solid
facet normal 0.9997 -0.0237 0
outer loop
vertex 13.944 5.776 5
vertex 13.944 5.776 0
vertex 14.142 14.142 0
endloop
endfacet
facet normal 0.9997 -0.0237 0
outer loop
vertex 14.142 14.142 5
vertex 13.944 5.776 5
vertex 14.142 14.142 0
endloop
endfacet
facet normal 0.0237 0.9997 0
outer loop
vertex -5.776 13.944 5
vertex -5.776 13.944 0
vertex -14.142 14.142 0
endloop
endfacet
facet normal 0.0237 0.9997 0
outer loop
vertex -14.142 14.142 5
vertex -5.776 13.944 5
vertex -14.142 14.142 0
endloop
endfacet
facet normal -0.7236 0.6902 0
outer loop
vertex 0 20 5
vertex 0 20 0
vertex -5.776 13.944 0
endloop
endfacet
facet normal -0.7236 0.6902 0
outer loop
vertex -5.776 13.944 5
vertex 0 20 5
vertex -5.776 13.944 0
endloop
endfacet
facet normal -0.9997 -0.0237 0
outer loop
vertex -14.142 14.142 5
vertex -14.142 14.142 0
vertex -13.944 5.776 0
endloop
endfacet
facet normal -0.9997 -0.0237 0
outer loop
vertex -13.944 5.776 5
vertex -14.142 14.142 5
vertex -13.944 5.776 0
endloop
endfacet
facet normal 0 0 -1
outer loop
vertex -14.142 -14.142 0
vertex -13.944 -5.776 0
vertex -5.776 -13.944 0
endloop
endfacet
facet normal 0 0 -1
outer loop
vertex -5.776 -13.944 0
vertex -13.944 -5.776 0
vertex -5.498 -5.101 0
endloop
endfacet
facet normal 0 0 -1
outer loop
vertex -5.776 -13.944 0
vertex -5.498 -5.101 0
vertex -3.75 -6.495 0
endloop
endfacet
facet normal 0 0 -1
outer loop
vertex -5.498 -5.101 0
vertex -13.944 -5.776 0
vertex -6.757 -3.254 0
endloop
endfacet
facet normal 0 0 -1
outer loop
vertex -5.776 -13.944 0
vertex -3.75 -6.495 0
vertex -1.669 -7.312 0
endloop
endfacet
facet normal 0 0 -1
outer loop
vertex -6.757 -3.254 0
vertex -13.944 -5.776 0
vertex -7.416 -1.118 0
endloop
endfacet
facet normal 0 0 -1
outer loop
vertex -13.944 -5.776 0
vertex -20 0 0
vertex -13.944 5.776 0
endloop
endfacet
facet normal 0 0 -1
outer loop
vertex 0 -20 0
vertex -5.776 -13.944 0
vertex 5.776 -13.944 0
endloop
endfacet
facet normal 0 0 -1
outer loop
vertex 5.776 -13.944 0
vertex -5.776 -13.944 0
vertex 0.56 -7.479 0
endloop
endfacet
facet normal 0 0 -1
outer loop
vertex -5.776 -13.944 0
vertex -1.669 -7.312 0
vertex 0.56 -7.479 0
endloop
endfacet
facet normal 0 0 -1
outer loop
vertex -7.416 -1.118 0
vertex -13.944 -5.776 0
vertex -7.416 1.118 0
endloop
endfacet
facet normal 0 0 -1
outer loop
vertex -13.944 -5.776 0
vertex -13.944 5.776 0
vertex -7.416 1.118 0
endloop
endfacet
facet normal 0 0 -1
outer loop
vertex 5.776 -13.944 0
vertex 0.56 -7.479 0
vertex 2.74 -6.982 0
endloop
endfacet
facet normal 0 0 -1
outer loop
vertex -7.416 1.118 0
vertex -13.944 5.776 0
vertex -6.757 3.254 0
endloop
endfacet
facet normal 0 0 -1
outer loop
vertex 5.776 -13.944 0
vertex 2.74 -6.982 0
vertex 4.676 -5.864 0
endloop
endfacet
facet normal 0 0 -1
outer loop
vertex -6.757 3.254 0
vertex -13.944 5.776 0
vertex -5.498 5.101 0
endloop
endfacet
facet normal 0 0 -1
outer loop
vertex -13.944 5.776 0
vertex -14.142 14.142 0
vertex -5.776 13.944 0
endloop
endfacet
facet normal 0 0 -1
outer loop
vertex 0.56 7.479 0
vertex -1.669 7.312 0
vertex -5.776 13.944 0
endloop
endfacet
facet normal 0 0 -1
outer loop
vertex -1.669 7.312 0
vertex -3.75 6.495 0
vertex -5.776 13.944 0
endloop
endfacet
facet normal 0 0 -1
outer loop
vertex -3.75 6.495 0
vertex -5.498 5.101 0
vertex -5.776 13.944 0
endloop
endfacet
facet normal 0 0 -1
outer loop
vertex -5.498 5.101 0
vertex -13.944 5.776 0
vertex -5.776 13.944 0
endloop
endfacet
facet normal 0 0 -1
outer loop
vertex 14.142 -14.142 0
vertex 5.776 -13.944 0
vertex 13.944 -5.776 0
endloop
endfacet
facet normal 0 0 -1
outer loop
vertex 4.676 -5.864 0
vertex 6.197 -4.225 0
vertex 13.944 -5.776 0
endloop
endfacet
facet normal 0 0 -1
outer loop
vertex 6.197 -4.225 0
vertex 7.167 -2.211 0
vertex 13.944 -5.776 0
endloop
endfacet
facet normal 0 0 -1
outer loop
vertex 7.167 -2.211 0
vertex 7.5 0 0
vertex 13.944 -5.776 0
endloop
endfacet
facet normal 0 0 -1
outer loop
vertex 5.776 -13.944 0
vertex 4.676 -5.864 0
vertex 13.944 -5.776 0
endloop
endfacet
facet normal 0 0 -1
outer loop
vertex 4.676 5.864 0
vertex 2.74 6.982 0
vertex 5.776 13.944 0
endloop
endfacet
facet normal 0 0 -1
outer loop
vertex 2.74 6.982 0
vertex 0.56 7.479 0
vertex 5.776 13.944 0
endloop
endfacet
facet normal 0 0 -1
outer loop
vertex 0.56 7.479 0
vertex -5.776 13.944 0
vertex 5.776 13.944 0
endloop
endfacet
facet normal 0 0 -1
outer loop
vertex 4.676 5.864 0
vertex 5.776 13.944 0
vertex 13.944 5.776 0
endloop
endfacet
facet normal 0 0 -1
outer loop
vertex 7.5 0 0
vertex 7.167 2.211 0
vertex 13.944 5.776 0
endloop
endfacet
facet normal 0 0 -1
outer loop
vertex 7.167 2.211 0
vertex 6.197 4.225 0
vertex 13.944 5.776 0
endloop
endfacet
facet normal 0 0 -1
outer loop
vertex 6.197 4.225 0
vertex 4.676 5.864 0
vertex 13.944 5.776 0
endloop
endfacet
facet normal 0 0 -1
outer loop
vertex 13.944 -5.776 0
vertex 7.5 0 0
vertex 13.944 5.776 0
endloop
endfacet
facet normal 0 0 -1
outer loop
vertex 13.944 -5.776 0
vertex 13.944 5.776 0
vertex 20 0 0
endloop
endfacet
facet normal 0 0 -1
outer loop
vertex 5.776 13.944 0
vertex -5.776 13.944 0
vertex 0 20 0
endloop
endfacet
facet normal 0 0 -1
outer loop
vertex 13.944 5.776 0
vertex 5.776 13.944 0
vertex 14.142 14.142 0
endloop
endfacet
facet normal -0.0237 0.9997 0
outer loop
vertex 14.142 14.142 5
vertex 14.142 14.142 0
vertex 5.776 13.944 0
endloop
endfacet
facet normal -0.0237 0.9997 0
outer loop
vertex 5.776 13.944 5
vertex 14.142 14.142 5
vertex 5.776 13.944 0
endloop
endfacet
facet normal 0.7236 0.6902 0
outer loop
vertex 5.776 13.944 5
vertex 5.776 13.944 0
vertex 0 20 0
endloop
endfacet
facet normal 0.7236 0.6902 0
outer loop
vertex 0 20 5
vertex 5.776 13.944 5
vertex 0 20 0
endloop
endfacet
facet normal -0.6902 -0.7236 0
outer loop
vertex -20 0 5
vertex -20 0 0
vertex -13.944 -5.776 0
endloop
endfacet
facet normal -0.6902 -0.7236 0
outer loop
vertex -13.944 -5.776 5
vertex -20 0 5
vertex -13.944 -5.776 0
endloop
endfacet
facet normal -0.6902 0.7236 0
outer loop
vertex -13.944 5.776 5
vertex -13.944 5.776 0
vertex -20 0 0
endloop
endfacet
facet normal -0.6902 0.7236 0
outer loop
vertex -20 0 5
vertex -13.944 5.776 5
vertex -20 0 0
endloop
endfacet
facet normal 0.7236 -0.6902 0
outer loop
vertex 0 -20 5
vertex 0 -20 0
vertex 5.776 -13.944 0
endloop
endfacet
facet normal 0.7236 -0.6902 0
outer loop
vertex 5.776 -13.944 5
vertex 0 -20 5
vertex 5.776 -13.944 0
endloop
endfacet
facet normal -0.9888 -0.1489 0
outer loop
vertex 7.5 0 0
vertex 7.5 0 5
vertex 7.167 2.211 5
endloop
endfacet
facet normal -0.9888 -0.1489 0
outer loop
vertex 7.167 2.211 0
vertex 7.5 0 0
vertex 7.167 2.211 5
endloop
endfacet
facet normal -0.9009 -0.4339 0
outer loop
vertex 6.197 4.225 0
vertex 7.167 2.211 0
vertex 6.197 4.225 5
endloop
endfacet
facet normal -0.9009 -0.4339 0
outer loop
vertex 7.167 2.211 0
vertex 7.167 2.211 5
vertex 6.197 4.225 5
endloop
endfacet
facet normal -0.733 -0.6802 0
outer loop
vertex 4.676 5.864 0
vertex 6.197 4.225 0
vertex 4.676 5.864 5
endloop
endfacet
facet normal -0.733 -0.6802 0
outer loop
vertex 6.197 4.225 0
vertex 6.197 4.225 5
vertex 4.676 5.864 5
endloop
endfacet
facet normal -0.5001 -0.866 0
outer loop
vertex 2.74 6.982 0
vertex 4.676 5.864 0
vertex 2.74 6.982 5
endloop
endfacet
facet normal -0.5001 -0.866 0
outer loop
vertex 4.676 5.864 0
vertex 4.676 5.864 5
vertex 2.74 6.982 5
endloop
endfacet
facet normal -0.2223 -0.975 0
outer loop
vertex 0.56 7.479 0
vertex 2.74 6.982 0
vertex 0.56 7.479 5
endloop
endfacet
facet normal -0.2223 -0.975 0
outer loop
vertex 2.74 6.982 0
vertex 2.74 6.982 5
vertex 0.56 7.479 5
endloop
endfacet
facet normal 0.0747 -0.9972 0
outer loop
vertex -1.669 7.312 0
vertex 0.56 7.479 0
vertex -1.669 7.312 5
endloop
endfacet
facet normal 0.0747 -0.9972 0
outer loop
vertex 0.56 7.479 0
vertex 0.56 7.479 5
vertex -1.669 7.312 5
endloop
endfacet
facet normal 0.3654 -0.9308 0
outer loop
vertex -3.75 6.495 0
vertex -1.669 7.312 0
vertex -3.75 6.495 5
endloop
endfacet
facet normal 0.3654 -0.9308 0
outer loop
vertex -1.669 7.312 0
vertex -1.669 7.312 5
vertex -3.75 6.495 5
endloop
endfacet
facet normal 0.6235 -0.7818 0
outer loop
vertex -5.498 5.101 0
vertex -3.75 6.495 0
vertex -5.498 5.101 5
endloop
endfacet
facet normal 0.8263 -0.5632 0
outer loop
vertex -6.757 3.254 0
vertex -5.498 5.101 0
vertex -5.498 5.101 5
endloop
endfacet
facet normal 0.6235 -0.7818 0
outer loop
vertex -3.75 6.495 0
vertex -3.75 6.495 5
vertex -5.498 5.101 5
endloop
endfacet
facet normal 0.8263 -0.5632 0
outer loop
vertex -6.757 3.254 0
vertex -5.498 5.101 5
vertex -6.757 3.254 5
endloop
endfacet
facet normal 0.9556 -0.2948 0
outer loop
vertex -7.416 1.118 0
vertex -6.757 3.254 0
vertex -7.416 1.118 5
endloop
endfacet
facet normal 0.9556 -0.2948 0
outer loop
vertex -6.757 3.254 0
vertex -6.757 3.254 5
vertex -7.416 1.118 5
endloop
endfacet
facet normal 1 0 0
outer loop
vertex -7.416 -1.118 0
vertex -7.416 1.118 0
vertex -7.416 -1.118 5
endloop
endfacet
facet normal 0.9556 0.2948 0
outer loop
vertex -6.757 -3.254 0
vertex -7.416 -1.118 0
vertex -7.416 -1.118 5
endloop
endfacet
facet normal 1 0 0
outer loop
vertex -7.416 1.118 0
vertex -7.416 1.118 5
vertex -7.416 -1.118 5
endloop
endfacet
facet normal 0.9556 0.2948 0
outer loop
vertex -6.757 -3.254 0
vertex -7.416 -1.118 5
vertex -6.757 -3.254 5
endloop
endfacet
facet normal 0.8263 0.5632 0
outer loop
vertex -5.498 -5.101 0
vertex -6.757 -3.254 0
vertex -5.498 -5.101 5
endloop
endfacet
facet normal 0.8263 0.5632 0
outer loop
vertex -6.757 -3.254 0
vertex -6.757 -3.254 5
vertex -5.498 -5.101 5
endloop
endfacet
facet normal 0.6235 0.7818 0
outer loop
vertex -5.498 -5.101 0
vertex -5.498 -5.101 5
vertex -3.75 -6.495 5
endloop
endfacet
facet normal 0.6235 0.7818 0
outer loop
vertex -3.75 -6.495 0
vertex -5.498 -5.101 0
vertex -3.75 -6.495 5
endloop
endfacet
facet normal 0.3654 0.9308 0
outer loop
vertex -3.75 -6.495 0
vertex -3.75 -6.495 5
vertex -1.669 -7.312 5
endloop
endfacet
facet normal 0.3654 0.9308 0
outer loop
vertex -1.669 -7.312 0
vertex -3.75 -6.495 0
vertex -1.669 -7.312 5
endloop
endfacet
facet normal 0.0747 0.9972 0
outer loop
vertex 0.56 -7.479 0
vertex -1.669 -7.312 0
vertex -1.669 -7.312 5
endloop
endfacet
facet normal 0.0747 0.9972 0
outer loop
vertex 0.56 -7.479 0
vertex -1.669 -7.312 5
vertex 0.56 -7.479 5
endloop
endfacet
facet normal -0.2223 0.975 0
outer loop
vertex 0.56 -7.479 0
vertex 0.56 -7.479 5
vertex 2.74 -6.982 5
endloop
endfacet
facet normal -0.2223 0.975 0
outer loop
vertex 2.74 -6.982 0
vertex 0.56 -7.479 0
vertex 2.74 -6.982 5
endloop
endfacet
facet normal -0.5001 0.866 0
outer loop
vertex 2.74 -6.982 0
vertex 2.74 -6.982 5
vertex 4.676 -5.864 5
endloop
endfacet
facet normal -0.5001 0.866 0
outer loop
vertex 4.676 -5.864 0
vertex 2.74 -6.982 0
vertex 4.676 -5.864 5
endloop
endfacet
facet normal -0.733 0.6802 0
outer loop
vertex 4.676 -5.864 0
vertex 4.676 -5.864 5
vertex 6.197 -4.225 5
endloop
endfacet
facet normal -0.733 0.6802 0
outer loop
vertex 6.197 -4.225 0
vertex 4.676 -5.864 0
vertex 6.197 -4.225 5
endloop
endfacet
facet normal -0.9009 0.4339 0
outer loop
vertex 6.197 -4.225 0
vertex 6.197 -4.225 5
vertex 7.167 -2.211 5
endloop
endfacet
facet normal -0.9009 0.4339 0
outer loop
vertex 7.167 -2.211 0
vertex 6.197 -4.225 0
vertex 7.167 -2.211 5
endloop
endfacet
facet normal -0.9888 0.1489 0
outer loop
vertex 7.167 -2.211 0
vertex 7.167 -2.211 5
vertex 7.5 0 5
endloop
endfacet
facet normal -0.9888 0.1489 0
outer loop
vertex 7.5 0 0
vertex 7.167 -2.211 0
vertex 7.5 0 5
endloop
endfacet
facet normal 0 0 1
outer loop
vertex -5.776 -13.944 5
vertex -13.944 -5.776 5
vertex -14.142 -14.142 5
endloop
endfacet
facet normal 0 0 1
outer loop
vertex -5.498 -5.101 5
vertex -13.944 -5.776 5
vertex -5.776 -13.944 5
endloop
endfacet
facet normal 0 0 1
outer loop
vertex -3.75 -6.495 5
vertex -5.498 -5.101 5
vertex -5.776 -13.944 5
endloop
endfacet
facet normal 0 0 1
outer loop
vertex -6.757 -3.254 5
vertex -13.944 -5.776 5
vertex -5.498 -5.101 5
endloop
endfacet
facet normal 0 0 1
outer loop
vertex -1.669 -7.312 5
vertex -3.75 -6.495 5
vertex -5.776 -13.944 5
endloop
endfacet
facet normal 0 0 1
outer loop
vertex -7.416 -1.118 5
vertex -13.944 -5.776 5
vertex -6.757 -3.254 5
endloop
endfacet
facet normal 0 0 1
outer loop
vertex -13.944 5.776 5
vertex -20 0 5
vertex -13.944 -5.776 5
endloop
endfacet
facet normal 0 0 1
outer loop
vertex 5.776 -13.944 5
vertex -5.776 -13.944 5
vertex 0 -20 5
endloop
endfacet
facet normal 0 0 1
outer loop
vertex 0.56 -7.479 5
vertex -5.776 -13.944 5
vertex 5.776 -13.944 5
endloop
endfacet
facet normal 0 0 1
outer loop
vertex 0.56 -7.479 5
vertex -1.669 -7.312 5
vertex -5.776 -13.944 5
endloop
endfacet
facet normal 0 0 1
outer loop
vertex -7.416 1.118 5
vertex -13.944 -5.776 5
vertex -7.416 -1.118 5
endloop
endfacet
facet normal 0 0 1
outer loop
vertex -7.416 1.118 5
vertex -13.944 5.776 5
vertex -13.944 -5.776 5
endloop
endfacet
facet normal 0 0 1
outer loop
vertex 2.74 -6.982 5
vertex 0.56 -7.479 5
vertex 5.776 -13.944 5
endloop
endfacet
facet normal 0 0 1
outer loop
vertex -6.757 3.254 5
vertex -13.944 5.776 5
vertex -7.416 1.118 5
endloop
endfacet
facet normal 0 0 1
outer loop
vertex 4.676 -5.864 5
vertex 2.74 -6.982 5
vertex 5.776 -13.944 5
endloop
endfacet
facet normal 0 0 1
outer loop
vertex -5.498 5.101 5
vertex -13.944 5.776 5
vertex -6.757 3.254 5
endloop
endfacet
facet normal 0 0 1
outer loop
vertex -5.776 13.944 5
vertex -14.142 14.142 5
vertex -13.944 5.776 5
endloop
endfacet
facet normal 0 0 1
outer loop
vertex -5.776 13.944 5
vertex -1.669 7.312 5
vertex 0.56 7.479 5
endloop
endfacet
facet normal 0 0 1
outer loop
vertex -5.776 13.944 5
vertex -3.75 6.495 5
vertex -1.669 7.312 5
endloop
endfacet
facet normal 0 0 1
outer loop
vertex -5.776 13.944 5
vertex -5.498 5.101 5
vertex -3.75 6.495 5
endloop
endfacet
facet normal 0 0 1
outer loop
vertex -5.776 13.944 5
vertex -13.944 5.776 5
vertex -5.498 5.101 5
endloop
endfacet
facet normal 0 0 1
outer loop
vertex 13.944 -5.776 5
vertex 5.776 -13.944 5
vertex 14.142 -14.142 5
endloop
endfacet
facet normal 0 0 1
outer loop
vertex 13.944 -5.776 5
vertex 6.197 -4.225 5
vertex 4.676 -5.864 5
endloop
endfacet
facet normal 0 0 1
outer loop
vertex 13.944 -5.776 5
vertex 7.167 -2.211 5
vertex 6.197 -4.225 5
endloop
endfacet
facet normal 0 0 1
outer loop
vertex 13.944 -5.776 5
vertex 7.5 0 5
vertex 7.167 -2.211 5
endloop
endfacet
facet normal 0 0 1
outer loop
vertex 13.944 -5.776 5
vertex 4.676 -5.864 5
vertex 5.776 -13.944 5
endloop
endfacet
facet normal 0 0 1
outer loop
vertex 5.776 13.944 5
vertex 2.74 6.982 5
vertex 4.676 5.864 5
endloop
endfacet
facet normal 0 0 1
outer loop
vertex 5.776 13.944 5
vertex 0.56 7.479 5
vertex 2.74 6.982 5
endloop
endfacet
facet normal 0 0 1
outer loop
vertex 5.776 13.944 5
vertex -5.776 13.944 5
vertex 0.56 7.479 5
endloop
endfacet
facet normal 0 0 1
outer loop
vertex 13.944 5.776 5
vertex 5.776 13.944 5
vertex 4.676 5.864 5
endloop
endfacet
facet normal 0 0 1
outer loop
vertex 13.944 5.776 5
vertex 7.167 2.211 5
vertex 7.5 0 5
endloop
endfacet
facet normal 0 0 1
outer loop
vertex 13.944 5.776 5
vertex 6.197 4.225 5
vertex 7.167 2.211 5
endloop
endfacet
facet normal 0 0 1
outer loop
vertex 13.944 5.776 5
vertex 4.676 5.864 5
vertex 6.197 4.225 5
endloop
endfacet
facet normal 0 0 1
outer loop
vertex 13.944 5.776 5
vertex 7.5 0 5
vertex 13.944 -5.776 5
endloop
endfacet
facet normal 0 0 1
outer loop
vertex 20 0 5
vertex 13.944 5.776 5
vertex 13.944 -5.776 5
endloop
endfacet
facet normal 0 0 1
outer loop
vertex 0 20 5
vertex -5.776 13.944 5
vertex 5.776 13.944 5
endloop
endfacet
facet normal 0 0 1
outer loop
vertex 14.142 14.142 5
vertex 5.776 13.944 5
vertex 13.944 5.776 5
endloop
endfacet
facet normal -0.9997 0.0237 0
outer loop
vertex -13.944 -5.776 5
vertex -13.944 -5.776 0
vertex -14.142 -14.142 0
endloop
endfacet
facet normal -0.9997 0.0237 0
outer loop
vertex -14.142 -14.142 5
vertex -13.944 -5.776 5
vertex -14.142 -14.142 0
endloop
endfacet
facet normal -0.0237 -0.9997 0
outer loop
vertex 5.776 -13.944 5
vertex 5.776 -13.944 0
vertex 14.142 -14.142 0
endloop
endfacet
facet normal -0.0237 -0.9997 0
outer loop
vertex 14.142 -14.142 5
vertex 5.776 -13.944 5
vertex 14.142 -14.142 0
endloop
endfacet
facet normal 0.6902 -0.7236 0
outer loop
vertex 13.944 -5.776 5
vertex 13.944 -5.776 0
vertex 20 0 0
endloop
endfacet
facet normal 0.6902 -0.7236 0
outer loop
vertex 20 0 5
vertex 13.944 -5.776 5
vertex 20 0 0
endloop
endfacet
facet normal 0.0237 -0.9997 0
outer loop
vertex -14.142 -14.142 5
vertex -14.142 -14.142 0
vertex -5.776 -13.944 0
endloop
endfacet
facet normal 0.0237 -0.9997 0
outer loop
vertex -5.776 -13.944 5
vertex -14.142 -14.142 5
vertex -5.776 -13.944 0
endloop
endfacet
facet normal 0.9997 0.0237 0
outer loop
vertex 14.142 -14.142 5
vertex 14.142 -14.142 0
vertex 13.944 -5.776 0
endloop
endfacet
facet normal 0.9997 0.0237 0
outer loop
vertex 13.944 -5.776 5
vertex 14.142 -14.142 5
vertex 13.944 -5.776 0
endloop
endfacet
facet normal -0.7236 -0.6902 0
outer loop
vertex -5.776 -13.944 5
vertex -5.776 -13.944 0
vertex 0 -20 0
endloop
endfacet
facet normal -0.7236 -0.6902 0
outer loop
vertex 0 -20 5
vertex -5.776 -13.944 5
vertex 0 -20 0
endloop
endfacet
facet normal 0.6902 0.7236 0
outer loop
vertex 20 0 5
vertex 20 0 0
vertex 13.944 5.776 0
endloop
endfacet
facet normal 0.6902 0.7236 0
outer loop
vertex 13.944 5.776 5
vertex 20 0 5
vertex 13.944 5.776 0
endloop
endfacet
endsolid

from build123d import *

# Parameters (mm, degrees)
F1_DEPTH = 5
F2_R     = 7.5
F3_DEPTH = 25


with BuildPart() as f1:
    # F0 (on Top) → F1 (new body)
    with BuildSketch(Plane.XY):
        with BuildLine():
            ThreePointArc((13.93824703, 5.5430379513), (14.7321706726, 2.8219049018), (15, 0))
            ThreePointArc((15, 0), (14.7321706726, -2.8219049018), (13.93824703, -5.5430379513))
            Line((13.93824703, -5.5430379513), (13.9437634587, -5.7756959351))
            Line((13.9437634587, -5.7756959351), (20, 0))
            Line((20, 0), (13.9437634587, 5.7756959351))
            Line((13.9437634587, 5.7756959351), (13.93824703, 5.5430379513))
        make_face()
        with BuildLine():
            ThreePointArc((13.7753487165, 5.9363092691), (13.8581929877, 5.7402514855), (13.93824703, 5.5430379513))
            Line((13.93824703, 5.5430379513), (13.9437634587, 5.7756959351))
            Line((13.9437634587, 5.7756959351), (13.7753487165, 5.9363092691))
        make_face()
        with BuildLine():
            Line((13.9437634587, -5.7756959351), (13.93824703, -5.5430379513))
            ThreePointArc((13.93824703, -5.5430379513), (13.8581929877, -5.7402514855), (13.7753487165, -5.9363092691))
            Line((13.7753487165, -5.9363092691), (13.9437634587, -5.7756959351))
        make_face()
        with BuildLine():
            ThreePointArc((5.9363092691, 13.7753487165), (10.6066017178, 10.6066017178), (13.7753487165, 5.9363092691))
            Line((13.7753487165, 5.9363092691), (13.9437634587, 5.7756959351))
            Line((13.9437634587, 5.7756959351), (14.1421356237, 14.1421356237))
            Line((14.1421356237, 14.1421356237), (5.7756959351, 13.9437634587))
            Line((5.7756959351, 13.9437634587), (5.9363092691, 13.7753487165))
        make_face()
        with BuildLine():
            Line((13.9437634587, -5.7756959351), (13.7753487165, -5.9363092691))
            ThreePointArc((13.7753487165, -5.9363092691), (10.6066017178, -10.6066017178), (5.9363092691, -13.7753487165))
            Line((5.9363092691, -13.7753487165), (5.7756959351, -13.9437634587))
            Line((5.7756959351, -13.9437634587), (14.1421356237, -14.1421356237))
            Line((14.1421356237, -14.1421356237), (13.9437634587, -5.7756959351))
        make_face()
        with BuildLine():
            ThreePointArc((5.5430379513, 13.93824703), (5.7402514855, 13.8581929877), (5.9363092691, 13.7753487165))
            Line((5.9363092691, 13.7753487165), (5.7756959351, 13.9437634587))
            Line((5.7756959351, 13.9437634587), (5.5430379513, 13.93824703))
        make_face()
        with BuildLine():
            Line((5.7756959351, -13.9437634587), (5.9363092691, -13.7753487165))
            ThreePointArc((5.9363092691, -13.7753487165), (5.7402514855, -13.8581929877), (5.5430379513, -13.93824703))
            Line((5.5430379513, -13.93824703), (5.7756959351, -13.9437634587))
        make_face()
        with BuildLine():
            ThreePointArc((0, 15), (2.8219049018, 14.7321706726), (5.5430379513, 13.93824703))
            Line((5.5430379513, 13.93824703), (5.7756959351, 13.9437634587))
            Line((5.7756959351, 13.9437634587), (0, 20))
            Line((0, 20), (0, 15))
        make_face()
        with BuildLine():
            Line((5.7756959351, -13.9437634587), (5.5430379513, -13.93824703))
            ThreePointArc((5.5430379513, -13.93824703), (0, -15), (-5.5430379513, -13.93824703))
            Line((-5.5430379513, -13.93824703), (-5.7756959351, -13.9437634587))
            Line((-5.7756959351, -13.9437634587), (0, -20))
            Line((0, -20), (5.7756959351, -13.9437634587))
        make_face()
        with BuildLine():
            ThreePointArc((-5.5430379513, 13.93824703), (-2.8219049018, 14.7321706726), (0, 15))
            Line((0, 15), (0, 20))
            Line((0, 20), (-5.7756959351, 13.9437634587))
            Line((-5.7756959351, 13.9437634587), (-5.5430379513, 13.93824703))
        make_face()
        with BuildLine():
            Line((-5.7756959351, -13.9437634587), (-5.5430379513, -13.93824703))
            ThreePointArc((-5.5430379513, -13.93824703), (-5.7402514855, -13.8581929877), (-5.9363092691, -13.7753487165))
            Line((-5.9363092691, -13.7753487165), (-5.7756959351, -13.9437634587))
        make_face()
        with BuildLine():
            ThreePointArc((-5.9363092691, 13.7753487165), (-5.7402514855, 13.8581929877), (-5.5430379513, 13.93824703))
            Line((-5.5430379513, 13.93824703), (-5.7756959351, 13.9437634587))
            Line((-5.7756959351, 13.9437634587), (-5.9363092691, 13.7753487165))
        make_face()
        with BuildLine():
            Line((-5.9363092691, 13.7753487165), (-5.7756959351, 13.9437634587))
            Line((-5.7756959351, 13.9437634587), (-14.1421356237, 14.1421356237))
            Line((-14.1421356237, 14.1421356237), (-13.9437634587, 5.7756959351))
            Line((-13.9437634587, 5.7756959351), (-13.7753487165, 5.9363092691))
            ThreePointArc((-13.7753487165, 5.9363092691), (-10.6066017178, 10.6066017178), (-5.9363092691, 13.7753487165))
        make_face()
        with BuildLine():
            Line((-5.7756959351, -13.9437634587), (-5.9363092691, -13.7753487165))
            ThreePointArc((-5.9363092691, -13.7753487165), (-10.6066017178, -10.6066017178), (-13.7753487165, -5.9363092691))
            Line((-13.7753487165, -5.9363092691), (-13.9437634587, -5.7756959351))
            Line((-13.9437634587, -5.7756959351), (-14.1421356237, -14.1421356237))
            Line((-14.1421356237, -14.1421356237), (-5.7756959351, -13.9437634587))
        make_face()
        with BuildLine():
            Line((-13.9437634587, -5.7756959351), (-13.7753487165, -5.9363092691))
            ThreePointArc((-13.7753487165, -5.9363092691), (-13.8581929877, -5.7402514855), (-13.93824703, -5.5430379513))
            Line((-13.93824703, -5.5430379513), (-13.9437634587, -5.7756959351))
        make_face()
        with BuildLine():
            ThreePointArc((-13.93824703, 5.5430379513), (-13.8581929877, 5.7402514855), (-13.7753487165, 5.9363092691))
            Line((-13.7753487165, 5.9363092691), (-13.9437634587, 5.7756959351))
            Line((-13.9437634587, 5.7756959351), (-13.93824703, 5.5430379513))
        make_face()
        with BuildLine():
            Line((-13.93824703, 5.5430379513), (-13.9437634587, 5.7756959351))
            Line((-13.9437634587, 5.7756959351), (-20, 0))
            Line((-20, 0), (-13.9437634587, -5.7756959351))
            Line((-13.9437634587, -5.7756959351), (-13.93824703, -5.5430379513))
            ThreePointArc((-13.93824703, -5.5430379513), (-15, 0), (-13.93824703, 5.5430379513))
        make_face()
        with BuildLine():
            ThreePointArc((13.93824703, -5.5430379513), (14.7321706726, -2.8219049018), (15, 0))
            ThreePointArc((15, 0), (14.7321706726, 2.8219049018), (13.93824703, 5.5430379513))
            ThreePointArc((13.93824703, 5.5430379513), (13.8581929877, 5.7402514855), (13.7753487165, 5.9363092691))
            ThreePointArc((13.7753487165, 5.9363092691), (10.6066017178, 10.6066017178), (5.9363092691, 13.7753487165))
            ThreePointArc((5.9363092691, 13.7753487165), (5.7402514855, 13.8581929877), (5.5430379513, 13.93824703))
            ThreePointArc((5.5430379513, 13.93824703), (2.8219049018, 14.7321706726), (0, 15))
            ThreePointArc((0, 15), (-2.8219049018, 14.7321706726), (-5.5430379513, 13.93824703))
            ThreePointArc((-5.5430379513, 13.93824703), (-5.7402514855, 13.8581929877), (-5.9363092691, 13.7753487165))
            ThreePointArc((-5.9363092691, 13.7753487165), (-10.6066017178, 10.6066017178), (-13.7753487165, 5.9363092691))
            ThreePointArc((-13.7753487165, 5.9363092691), (-13.8581929877, 5.7402514855), (-13.93824703, 5.5430379513))
            ThreePointArc((-13.93824703, 5.5430379513), (-15, 0), (-13.93824703, -5.5430379513))
            ThreePointArc((-13.93824703, -5.5430379513), (-13.8581929877, -5.7402514855), (-13.7753487165, -5.9363092691))
            ThreePointArc((-13.7753487165, -5.9363092691), (-10.6066017178, -10.6066017178), (-5.9363092691, -13.7753487165))
            ThreePointArc((-5.9363092691, -13.7753487165), (-5.7402514855, -13.8581929877), (-5.5430379513, -13.93824703))
            ThreePointArc((-5.5430379513, -13.93824703), (0, -15), (5.5430379513, -13.93824703))
            ThreePointArc((5.5430379513, -13.93824703), (5.7402514855, -13.8581929877), (5.9363092691, -13.7753487165))
            ThreePointArc((5.9363092691, -13.7753487165), (10.6066017178, -10.6066017178), (13.7753487165, -5.9363092691))
            ThreePointArc((13.7753487165, -5.9363092691), (13.8581929877, -5.7402514855), (13.93824703, -5.5430379513))
        make_face()
    extrude(amount=F1_DEPTH)

    # F2 (on face) → F3 (cut)
    with BuildSketch(Plane.XY.offset(5)):
        Circle(F2_R)
    extrude(amount=-F3_DEPTH, mode=Mode.SUBTRACT)


solid = f1.part
